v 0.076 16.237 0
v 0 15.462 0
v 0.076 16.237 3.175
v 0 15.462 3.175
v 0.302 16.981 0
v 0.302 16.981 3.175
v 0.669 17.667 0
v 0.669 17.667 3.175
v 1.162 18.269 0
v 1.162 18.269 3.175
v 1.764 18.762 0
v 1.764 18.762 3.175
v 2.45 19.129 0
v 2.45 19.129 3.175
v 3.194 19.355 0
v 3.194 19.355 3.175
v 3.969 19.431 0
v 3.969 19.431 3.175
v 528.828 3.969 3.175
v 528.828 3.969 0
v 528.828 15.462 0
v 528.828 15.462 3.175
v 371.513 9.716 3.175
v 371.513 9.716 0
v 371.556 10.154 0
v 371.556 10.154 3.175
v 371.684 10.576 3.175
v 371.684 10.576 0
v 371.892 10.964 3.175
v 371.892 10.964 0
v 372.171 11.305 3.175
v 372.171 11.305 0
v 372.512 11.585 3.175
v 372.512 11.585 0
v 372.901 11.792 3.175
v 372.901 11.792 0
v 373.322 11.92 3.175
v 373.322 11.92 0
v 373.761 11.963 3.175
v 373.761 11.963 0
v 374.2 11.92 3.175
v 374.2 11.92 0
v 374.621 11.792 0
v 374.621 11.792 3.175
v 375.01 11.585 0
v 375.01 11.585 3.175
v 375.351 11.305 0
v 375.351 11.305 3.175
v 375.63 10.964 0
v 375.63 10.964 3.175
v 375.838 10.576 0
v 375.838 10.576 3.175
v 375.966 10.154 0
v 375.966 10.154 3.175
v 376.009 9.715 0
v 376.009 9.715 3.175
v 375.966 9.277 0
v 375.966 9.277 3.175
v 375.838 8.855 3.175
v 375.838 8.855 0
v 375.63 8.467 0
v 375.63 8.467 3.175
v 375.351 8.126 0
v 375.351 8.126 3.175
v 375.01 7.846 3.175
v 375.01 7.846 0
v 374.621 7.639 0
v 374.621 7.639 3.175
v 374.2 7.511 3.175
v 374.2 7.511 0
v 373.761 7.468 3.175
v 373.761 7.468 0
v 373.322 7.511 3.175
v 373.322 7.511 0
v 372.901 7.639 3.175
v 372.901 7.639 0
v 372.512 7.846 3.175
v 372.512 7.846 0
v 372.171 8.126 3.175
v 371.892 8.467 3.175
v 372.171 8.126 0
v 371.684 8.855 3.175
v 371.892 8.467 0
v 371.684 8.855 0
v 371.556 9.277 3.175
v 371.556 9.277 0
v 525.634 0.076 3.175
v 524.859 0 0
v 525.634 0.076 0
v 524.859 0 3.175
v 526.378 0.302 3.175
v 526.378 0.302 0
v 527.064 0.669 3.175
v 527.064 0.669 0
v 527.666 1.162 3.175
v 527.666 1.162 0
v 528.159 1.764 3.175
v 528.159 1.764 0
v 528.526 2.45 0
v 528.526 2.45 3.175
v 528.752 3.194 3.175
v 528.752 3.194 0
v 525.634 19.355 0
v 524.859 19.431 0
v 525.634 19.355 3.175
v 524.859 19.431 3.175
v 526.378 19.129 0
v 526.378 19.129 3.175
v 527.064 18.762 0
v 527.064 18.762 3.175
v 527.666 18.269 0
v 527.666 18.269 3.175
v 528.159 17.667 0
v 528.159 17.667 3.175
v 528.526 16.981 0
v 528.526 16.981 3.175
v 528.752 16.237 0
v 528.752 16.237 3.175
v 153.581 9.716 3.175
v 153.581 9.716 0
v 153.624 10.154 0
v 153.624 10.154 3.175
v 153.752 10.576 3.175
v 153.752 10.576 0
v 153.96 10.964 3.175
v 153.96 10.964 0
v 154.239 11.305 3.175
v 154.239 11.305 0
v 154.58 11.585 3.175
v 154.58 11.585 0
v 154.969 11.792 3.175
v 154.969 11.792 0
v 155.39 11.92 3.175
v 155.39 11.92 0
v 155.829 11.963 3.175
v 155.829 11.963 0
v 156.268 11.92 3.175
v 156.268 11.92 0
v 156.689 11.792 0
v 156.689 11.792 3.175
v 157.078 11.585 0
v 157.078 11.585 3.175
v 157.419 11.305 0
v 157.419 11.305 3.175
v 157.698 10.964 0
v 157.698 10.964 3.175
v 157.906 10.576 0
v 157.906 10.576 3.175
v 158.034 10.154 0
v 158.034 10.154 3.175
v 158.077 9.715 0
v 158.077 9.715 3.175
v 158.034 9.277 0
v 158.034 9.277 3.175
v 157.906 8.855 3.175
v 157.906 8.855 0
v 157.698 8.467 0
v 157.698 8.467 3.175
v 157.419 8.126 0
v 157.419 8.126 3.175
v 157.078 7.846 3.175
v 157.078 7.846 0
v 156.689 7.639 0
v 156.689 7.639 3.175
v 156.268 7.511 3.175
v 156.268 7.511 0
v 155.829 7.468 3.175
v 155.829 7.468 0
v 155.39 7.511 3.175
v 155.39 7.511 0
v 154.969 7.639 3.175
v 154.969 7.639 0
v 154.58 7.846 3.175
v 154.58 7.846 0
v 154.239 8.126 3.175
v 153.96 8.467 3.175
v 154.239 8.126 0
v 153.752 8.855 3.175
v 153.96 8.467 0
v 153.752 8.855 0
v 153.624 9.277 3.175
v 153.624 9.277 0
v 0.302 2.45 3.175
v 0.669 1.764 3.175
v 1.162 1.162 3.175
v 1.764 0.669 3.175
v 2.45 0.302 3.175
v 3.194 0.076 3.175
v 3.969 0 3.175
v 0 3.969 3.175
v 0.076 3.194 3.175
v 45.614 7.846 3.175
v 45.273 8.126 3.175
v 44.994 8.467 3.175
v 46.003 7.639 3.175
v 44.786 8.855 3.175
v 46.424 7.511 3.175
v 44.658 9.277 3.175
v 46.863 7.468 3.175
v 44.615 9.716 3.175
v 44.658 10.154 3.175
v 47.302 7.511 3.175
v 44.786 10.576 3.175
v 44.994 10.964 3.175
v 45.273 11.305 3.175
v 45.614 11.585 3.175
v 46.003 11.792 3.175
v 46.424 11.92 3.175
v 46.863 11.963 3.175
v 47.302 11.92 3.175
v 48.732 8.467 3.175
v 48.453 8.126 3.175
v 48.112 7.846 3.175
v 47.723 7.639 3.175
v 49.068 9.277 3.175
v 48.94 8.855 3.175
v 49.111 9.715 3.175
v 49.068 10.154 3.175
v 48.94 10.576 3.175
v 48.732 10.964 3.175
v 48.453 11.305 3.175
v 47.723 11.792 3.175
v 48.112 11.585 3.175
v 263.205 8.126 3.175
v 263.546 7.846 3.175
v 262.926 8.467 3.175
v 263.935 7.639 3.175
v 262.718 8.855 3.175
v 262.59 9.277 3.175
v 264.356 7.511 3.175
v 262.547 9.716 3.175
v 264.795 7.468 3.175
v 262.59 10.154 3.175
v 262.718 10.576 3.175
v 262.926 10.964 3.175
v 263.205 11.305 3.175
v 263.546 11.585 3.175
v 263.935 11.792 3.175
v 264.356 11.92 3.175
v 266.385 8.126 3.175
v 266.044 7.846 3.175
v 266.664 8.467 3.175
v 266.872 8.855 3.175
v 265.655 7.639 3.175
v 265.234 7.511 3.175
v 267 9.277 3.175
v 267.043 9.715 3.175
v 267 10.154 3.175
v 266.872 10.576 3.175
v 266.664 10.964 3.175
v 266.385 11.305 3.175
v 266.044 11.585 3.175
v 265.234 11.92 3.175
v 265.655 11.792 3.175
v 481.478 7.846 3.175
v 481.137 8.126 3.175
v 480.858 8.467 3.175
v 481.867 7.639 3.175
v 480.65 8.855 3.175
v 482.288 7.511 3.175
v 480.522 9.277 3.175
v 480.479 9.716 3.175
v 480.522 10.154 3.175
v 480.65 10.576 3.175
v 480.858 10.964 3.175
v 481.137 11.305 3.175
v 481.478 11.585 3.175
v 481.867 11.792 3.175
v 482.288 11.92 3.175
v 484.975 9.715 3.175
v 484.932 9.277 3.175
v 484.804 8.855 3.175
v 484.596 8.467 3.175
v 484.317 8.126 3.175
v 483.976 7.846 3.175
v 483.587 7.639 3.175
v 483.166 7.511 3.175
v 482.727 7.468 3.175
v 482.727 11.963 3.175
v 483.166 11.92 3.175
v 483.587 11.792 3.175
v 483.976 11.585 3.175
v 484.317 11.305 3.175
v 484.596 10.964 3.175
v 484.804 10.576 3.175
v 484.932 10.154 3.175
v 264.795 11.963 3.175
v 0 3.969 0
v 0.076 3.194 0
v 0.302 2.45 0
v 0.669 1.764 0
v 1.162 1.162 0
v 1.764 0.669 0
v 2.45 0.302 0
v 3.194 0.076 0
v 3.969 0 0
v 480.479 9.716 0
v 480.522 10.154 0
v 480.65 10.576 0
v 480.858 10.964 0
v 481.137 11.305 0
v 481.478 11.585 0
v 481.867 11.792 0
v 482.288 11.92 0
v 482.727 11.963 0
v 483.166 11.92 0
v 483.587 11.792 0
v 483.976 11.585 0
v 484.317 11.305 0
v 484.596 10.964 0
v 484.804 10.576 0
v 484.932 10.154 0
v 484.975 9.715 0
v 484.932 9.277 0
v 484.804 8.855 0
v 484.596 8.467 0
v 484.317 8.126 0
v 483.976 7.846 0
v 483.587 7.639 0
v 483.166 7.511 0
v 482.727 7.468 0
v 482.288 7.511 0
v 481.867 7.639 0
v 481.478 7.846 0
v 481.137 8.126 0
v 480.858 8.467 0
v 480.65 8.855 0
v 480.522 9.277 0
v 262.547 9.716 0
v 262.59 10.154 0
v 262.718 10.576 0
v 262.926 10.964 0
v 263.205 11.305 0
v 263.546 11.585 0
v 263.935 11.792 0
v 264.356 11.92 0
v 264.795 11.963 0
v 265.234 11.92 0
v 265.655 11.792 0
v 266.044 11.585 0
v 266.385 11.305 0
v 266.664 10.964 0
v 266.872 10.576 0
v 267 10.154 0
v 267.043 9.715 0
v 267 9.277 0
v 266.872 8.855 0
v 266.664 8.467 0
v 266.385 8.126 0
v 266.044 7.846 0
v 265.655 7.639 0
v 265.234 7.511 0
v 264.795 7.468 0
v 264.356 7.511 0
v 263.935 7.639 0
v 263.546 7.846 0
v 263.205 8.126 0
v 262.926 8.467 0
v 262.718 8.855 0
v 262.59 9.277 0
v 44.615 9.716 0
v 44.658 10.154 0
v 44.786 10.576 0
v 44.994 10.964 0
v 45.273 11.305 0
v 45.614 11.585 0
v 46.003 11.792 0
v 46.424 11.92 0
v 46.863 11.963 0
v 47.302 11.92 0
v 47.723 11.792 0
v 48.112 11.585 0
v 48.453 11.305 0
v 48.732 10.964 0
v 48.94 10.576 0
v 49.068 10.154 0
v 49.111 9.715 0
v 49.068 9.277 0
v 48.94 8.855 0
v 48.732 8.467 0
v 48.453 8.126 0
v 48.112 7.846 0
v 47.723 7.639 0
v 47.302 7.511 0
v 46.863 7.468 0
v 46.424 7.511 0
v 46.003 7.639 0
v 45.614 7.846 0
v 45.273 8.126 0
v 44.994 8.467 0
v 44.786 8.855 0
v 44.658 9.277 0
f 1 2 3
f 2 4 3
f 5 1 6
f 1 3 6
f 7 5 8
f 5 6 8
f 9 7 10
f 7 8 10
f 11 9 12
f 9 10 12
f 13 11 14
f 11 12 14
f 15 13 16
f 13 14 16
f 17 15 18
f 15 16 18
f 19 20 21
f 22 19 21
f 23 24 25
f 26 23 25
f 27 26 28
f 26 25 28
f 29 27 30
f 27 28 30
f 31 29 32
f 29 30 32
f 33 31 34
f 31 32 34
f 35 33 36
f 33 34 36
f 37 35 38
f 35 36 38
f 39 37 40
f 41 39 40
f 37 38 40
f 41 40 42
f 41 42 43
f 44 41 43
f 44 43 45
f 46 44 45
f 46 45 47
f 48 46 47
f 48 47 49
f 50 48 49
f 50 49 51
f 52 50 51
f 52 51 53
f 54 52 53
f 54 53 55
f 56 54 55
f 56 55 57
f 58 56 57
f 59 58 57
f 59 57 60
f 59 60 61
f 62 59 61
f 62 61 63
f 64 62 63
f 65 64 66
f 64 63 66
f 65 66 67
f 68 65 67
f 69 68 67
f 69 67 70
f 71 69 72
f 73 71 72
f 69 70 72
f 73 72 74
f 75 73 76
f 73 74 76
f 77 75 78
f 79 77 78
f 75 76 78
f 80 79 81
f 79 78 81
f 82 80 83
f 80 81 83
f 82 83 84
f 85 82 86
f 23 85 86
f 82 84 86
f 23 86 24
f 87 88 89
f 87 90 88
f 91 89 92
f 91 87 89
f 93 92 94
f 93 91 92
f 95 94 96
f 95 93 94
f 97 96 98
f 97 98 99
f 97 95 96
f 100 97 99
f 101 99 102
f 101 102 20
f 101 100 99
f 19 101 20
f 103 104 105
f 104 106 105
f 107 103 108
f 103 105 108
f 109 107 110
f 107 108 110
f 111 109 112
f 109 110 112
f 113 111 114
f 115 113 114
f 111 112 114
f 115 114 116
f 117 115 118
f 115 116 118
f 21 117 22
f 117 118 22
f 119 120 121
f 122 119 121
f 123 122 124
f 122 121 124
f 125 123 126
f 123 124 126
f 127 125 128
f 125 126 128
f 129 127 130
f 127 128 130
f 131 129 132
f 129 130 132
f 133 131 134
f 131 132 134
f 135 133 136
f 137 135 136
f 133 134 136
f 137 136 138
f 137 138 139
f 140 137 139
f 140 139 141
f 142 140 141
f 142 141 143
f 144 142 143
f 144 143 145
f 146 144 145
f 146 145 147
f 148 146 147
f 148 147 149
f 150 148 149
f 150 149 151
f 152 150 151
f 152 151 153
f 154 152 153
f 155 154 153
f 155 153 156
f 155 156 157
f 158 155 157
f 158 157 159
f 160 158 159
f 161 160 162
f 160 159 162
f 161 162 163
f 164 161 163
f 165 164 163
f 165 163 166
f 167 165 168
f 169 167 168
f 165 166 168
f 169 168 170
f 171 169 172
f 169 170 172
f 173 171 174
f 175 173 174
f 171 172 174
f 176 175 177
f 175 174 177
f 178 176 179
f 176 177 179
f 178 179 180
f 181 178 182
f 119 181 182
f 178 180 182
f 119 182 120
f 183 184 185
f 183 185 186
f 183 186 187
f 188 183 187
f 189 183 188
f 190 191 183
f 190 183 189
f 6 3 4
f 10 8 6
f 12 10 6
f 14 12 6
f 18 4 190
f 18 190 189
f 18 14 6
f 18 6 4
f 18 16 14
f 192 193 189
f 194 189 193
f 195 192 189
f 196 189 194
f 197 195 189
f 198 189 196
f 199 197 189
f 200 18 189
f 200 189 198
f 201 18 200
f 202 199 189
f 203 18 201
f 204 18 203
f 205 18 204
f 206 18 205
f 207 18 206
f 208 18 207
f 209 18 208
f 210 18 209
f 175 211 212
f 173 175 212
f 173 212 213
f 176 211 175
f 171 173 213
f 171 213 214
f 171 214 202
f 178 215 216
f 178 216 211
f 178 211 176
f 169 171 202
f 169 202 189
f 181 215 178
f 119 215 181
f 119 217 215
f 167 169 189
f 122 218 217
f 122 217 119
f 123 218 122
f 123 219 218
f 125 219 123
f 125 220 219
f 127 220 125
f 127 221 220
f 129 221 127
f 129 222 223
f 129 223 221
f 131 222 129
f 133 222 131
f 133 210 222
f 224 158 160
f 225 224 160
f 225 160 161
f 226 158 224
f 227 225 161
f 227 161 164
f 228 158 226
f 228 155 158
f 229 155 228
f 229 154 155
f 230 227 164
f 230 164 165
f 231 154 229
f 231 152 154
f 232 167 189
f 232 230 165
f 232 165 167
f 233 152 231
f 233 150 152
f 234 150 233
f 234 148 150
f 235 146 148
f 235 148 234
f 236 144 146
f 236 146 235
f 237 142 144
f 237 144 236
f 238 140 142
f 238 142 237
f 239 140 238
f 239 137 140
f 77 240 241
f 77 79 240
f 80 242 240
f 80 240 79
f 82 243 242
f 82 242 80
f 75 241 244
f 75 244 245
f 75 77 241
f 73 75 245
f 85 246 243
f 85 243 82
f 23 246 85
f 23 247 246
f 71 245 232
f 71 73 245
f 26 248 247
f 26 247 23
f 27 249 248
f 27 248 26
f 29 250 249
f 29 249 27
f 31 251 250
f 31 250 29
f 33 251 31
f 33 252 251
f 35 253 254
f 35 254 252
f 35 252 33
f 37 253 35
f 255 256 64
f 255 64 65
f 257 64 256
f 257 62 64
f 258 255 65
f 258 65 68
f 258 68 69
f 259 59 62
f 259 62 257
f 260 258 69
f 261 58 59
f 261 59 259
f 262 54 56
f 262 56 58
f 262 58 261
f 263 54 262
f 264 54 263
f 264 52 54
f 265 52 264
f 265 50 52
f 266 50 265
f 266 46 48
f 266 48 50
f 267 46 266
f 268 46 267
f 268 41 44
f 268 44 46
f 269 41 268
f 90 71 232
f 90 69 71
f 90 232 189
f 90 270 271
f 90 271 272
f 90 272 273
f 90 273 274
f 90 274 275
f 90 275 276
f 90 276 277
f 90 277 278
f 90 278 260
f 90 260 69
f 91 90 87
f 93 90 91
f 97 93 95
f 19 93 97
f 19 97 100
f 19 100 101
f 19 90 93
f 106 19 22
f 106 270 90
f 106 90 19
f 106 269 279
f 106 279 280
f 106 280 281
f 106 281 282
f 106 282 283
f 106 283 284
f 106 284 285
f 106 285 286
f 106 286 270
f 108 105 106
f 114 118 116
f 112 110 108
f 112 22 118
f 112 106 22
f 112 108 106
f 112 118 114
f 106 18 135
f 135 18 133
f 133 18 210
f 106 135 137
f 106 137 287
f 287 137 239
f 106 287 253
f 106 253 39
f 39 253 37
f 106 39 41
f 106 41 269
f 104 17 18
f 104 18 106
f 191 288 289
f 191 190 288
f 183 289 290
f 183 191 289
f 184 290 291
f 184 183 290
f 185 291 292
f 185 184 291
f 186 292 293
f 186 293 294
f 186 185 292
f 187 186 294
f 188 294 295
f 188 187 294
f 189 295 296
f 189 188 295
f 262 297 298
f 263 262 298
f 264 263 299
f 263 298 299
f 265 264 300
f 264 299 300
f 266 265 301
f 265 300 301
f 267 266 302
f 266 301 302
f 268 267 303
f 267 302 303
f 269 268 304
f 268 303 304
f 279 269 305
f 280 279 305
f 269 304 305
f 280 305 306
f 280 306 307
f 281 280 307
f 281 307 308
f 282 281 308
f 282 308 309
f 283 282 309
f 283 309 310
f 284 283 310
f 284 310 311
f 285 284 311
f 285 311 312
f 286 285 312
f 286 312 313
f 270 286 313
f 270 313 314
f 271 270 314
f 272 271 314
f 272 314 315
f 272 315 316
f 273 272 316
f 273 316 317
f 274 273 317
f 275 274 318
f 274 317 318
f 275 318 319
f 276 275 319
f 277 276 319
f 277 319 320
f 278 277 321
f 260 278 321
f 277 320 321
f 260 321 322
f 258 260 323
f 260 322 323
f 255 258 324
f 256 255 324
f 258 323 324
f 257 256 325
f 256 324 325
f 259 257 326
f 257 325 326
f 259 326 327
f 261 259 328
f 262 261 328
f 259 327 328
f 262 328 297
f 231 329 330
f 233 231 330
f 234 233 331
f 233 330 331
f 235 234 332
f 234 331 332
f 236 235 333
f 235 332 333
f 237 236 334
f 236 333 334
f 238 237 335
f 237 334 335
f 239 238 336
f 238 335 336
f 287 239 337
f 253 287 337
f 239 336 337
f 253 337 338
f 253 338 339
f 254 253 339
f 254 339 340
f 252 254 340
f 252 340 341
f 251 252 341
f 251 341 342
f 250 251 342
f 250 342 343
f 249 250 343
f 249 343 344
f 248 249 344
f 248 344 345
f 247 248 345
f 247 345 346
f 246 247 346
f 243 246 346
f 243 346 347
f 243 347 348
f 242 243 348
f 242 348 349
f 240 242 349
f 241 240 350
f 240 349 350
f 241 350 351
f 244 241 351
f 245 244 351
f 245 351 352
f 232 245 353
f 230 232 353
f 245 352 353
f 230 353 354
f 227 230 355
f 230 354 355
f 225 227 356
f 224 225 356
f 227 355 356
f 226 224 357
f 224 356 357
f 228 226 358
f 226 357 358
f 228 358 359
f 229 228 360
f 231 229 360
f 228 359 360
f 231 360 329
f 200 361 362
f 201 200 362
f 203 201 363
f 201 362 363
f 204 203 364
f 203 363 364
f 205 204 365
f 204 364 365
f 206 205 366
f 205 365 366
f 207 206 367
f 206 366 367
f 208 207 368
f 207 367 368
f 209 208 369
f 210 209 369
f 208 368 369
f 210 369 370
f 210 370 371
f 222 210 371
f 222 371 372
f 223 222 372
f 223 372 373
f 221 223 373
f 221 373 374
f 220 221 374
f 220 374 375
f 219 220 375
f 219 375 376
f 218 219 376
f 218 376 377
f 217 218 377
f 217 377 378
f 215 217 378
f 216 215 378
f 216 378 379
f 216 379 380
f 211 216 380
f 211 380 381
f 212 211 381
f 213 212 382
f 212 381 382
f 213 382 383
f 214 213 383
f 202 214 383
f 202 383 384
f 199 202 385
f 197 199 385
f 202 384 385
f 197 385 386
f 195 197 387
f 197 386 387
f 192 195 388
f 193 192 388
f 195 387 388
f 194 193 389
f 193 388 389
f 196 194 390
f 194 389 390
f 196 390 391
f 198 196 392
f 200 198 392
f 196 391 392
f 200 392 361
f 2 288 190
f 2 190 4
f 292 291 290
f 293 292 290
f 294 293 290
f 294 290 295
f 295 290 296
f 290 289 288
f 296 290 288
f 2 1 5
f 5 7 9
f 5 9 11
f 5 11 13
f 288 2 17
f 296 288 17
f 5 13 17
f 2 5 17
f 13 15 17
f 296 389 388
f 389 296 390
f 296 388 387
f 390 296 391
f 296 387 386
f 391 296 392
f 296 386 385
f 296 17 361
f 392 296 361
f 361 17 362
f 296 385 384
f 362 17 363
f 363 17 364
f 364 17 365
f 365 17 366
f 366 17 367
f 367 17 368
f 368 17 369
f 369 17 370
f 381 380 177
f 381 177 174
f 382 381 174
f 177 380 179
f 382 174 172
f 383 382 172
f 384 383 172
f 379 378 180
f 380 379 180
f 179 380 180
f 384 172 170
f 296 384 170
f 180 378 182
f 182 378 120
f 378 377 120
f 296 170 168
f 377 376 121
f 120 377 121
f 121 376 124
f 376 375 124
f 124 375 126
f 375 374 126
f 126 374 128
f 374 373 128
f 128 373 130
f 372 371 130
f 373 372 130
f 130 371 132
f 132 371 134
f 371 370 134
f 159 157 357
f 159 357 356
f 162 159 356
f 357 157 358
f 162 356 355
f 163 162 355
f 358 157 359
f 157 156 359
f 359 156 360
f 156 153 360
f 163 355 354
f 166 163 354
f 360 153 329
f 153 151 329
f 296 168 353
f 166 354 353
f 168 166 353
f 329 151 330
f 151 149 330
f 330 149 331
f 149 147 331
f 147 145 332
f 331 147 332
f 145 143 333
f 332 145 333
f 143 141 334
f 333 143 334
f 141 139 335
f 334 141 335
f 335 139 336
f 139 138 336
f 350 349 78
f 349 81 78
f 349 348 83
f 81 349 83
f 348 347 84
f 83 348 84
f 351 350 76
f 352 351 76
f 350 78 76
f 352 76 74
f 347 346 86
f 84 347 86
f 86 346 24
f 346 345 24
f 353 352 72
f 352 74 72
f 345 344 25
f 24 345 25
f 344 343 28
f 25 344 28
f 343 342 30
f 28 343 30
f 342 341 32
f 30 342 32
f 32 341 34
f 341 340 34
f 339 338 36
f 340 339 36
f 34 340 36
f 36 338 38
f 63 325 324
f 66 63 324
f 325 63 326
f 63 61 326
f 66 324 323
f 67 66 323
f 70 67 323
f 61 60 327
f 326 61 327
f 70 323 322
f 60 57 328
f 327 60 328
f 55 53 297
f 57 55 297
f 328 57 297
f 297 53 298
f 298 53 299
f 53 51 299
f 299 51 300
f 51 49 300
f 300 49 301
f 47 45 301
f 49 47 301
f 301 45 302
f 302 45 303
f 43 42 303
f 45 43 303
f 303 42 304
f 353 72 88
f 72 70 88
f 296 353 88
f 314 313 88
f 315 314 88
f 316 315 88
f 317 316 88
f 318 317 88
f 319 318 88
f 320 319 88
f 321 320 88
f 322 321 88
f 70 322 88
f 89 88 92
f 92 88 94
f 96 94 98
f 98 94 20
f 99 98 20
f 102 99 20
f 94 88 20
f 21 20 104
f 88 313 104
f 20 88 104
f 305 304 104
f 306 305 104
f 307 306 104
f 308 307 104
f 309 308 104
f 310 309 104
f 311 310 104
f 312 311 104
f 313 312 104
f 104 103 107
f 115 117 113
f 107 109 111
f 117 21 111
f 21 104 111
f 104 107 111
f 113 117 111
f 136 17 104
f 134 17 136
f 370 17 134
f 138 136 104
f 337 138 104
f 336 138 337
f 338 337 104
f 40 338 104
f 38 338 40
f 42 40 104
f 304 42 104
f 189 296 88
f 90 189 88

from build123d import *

# Parameters (mm, degrees)
SKETCH1_W             = 528.828
SKETCH1_H             = 19.431
BOSS_EXTRUDE1_DEPTH   = 3.175
F_8_CLEARANCE_HOLE1_D = 4.4958
FILLET1_R             = 3.96875
LPATTERN1_COUNT       = 5
LPATTERN1_PITCH       = 108.966


with BuildPart() as part:
    # Sketch1 → Boss-Extrude1 (new body)
    with BuildSketch(Plane.XY):
        with Locations((264.414, 9.7155)):
            Rectangle(SKETCH1_W, SKETCH1_H)
    extrude(amount=BOSS_EXTRUDE1_DEPTH)

    # #8 Clearance Hole1 (through all)
    with Locations(Plane.XY.offset(3.175)):
        with Locations((46.863, 9.7155)):
            f_8_clearance_hole1 = Hole(F_8_CLEARANCE_HOLE1_D / 2)

    # Fillet1
    fillet1_edges = [part.edges().sort_by_distance(p)[0] for p in [
        (0, 19.431, 1.5875),
        (528.828, 19.431, 1.5875),
        (528.828, 0, 1.5875),
        (0, 0, 1.5875),
    ]]
    fillet(fillet1_edges, radius=FILLET1_R)

    # LPattern1: #8 Clearance Hole1 ×5
    with Locations(*[(i * LPATTERN1_PITCH, 0, 0) for i in range(1, LPATTERN1_COUNT)]):
        add(f_8_clearance_hole1, mode=Mode.SUBTRACT)


solid = part.part
